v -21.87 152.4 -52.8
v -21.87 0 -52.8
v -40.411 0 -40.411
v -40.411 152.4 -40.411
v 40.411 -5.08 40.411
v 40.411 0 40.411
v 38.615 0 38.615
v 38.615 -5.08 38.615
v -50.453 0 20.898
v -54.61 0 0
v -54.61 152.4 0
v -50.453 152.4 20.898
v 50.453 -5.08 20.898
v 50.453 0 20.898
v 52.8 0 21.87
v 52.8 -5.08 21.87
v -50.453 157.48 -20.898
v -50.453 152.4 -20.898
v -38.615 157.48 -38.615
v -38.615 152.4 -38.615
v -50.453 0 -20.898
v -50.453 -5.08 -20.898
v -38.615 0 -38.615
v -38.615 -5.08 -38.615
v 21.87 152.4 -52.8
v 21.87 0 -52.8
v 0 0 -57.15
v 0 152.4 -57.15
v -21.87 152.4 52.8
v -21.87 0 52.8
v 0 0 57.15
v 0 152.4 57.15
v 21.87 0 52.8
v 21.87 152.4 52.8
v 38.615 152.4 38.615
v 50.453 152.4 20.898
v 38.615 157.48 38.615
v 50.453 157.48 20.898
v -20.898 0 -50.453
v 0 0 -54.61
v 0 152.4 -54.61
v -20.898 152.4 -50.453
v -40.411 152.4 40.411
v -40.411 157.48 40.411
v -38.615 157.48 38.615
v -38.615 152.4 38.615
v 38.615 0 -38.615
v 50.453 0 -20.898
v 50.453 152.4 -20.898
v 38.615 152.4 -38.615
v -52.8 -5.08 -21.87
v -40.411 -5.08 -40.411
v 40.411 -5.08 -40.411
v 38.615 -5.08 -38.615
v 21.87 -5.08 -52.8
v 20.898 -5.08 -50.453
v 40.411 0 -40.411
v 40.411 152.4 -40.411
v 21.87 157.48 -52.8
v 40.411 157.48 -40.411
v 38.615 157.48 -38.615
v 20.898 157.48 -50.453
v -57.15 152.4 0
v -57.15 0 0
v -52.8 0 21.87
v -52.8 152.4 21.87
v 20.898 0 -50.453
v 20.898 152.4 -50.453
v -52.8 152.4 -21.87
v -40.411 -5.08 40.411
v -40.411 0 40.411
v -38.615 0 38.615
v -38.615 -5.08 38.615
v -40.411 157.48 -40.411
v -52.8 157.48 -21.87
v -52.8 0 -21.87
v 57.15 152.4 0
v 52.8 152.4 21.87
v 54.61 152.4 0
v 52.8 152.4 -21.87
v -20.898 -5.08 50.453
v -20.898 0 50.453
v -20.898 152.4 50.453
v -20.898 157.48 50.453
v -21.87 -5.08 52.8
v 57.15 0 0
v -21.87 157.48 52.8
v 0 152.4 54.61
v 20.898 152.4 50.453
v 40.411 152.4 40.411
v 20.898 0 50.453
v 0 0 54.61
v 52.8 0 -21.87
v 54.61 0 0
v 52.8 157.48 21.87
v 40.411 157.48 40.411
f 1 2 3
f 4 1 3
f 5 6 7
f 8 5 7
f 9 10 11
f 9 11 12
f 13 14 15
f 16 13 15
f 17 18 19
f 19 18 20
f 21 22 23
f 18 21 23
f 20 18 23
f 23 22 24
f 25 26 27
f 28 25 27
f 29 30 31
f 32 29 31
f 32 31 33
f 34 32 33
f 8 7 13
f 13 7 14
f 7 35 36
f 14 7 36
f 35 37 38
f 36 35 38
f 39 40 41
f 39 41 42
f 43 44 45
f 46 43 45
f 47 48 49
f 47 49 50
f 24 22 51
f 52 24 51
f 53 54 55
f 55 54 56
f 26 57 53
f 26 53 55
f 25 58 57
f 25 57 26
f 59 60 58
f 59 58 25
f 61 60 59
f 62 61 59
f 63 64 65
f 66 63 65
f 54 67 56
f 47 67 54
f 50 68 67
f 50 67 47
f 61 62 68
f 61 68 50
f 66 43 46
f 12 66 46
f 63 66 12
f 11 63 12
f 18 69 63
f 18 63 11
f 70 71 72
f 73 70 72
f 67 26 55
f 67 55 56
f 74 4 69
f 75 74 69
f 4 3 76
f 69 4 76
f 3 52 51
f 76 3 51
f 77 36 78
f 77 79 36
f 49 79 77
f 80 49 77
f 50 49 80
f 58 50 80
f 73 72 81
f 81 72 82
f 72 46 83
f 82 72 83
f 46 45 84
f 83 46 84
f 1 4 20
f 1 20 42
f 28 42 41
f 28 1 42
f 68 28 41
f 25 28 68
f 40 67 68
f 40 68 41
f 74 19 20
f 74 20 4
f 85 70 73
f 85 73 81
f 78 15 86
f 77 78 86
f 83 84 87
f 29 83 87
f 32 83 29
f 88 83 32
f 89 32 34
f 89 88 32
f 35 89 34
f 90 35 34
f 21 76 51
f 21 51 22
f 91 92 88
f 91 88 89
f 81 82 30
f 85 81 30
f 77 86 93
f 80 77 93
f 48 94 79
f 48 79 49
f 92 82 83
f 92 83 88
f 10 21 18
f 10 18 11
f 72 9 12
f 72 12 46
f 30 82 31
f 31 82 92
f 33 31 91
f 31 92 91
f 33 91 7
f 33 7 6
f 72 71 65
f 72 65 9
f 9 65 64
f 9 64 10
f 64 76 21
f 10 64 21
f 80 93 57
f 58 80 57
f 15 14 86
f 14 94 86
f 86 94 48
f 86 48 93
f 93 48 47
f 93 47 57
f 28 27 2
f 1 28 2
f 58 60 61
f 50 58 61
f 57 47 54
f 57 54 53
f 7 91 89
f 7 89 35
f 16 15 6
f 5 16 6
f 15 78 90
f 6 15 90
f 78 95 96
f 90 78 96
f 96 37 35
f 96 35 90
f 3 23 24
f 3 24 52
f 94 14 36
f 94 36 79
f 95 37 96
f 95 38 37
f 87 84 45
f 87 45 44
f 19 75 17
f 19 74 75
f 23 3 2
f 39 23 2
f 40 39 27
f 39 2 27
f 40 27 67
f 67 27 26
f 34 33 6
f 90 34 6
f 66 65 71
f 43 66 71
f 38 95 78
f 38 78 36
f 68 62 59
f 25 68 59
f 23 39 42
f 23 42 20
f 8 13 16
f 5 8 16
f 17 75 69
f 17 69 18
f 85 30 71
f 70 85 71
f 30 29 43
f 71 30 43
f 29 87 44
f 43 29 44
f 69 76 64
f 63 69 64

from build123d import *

# Parameters (mm, degrees)
BOSS_EXTRUDE1_DEPTH = 152.4
BOSS_EXTRUDE2_DEPTH = 5.08
BOSS_EXTRUDE3_DEPTH = 5.08


with BuildPart() as part:
    # Sketch1 → Boss-Extrude1 (new body)
    with BuildSketch(Plane(origin=(0, 0, 0), x_dir=(1, 0, 0), z_dir=(0, 1, 0))):
        Polygon((-40.411152545, -40.411152545), (-21.87035816, -52.799715283), (0, -57.15), (21.87035816, -52.799715283), (40.411152545, -40.411152545), (52.799715283, -21.87035816), (57.15, 0), (52.799715283, 21.87035816), (40.411152545, 40.411152545), (21.87035816, 52.799715283), (0, 57.15), (-21.87035816, 52.799715283), (-40.411152545, 40.411152545), (-52.799715283, 21.87035816), (-57.15, 0), (-52.799715283, -21.87035816), align=None)
        Polygon((0, 54.61), (-20.898342241, 50.45306127), (-38.615101321, 38.615101321), (-50.45306127, 20.898342241), (-54.61, 0), (-50.45306127, -20.898342241), (-38.615101321, -38.615101321), (-20.898342241, -50.45306127), (0, -54.61), (20.898342241, -50.45306127), (38.615101321, -38.615101321), (50.45306127, -20.898342241), (54.61, 0), (50.45306127, 20.898342241), (38.615101321, 38.615101321), (20.898342241, 50.45306127), align=None, mode=Mode.SUBTRACT)
    extrude(amount=BOSS_EXTRUDE1_DEPTH)

    # Sketch2 → Boss-Extrude2 (add)
    with BuildSketch(Plane(origin=(0, 152.4, 0), x_dir=(1, 0, 0), z_dir=(0, 1, 0))):
        Polygon((-52.799715283, 21.87035816), (-50.45306127, 20.898342241), (-38.615101321, 38.615101321), (-40.411152545, 40.411152545), align=None)
        Polygon((-38.615101321, -38.615101321), (-20.898342241, -50.45306127), (-21.87035816, -52.799715283), (-40.411152545, -40.411152545), align=None)
        Polygon((38.615101321, -38.615101321), (40.411152545, -40.411152545), (52.799715283, -21.87035816), (50.45306127, -20.898342241), align=None)
        Polygon((40.411152545, 40.411152545), (38.615101321, 38.615101321), (20.898342241, 50.45306127), (21.87035816, 52.799715283), align=None)
    extrude(amount=BOSS_EXTRUDE2_DEPTH)

    # Sketch3 → Boss-Extrude3 (add)
    with BuildSketch(Plane.XZ):
        Polygon((38.615101321, -38.615101321), (40.411152545, -40.411152545), (21.87035816, -52.799715283), (20.898342241, -50.45306127), align=None)
        Polygon((50.45306127, 20.898342241), (52.799715283, 21.87035816), (40.411152545, 40.411152545), (38.615101321, 38.615101321), align=None)
        Polygon((-40.411152545, 40.411152545), (-38.615101321, 38.615101321), (-20.898342241, 50.45306127), (-21.87035816, 52.799715283), align=None)
        Polygon((-50.45306127, -20.898342241), (-38.615101321, -38.615101321), (-40.411152545, -40.411152545), (-52.799715283, -21.87035816), align=None)
    extrude(amount=BOSS_EXTRUDE3_DEPTH)


solid = part.part
